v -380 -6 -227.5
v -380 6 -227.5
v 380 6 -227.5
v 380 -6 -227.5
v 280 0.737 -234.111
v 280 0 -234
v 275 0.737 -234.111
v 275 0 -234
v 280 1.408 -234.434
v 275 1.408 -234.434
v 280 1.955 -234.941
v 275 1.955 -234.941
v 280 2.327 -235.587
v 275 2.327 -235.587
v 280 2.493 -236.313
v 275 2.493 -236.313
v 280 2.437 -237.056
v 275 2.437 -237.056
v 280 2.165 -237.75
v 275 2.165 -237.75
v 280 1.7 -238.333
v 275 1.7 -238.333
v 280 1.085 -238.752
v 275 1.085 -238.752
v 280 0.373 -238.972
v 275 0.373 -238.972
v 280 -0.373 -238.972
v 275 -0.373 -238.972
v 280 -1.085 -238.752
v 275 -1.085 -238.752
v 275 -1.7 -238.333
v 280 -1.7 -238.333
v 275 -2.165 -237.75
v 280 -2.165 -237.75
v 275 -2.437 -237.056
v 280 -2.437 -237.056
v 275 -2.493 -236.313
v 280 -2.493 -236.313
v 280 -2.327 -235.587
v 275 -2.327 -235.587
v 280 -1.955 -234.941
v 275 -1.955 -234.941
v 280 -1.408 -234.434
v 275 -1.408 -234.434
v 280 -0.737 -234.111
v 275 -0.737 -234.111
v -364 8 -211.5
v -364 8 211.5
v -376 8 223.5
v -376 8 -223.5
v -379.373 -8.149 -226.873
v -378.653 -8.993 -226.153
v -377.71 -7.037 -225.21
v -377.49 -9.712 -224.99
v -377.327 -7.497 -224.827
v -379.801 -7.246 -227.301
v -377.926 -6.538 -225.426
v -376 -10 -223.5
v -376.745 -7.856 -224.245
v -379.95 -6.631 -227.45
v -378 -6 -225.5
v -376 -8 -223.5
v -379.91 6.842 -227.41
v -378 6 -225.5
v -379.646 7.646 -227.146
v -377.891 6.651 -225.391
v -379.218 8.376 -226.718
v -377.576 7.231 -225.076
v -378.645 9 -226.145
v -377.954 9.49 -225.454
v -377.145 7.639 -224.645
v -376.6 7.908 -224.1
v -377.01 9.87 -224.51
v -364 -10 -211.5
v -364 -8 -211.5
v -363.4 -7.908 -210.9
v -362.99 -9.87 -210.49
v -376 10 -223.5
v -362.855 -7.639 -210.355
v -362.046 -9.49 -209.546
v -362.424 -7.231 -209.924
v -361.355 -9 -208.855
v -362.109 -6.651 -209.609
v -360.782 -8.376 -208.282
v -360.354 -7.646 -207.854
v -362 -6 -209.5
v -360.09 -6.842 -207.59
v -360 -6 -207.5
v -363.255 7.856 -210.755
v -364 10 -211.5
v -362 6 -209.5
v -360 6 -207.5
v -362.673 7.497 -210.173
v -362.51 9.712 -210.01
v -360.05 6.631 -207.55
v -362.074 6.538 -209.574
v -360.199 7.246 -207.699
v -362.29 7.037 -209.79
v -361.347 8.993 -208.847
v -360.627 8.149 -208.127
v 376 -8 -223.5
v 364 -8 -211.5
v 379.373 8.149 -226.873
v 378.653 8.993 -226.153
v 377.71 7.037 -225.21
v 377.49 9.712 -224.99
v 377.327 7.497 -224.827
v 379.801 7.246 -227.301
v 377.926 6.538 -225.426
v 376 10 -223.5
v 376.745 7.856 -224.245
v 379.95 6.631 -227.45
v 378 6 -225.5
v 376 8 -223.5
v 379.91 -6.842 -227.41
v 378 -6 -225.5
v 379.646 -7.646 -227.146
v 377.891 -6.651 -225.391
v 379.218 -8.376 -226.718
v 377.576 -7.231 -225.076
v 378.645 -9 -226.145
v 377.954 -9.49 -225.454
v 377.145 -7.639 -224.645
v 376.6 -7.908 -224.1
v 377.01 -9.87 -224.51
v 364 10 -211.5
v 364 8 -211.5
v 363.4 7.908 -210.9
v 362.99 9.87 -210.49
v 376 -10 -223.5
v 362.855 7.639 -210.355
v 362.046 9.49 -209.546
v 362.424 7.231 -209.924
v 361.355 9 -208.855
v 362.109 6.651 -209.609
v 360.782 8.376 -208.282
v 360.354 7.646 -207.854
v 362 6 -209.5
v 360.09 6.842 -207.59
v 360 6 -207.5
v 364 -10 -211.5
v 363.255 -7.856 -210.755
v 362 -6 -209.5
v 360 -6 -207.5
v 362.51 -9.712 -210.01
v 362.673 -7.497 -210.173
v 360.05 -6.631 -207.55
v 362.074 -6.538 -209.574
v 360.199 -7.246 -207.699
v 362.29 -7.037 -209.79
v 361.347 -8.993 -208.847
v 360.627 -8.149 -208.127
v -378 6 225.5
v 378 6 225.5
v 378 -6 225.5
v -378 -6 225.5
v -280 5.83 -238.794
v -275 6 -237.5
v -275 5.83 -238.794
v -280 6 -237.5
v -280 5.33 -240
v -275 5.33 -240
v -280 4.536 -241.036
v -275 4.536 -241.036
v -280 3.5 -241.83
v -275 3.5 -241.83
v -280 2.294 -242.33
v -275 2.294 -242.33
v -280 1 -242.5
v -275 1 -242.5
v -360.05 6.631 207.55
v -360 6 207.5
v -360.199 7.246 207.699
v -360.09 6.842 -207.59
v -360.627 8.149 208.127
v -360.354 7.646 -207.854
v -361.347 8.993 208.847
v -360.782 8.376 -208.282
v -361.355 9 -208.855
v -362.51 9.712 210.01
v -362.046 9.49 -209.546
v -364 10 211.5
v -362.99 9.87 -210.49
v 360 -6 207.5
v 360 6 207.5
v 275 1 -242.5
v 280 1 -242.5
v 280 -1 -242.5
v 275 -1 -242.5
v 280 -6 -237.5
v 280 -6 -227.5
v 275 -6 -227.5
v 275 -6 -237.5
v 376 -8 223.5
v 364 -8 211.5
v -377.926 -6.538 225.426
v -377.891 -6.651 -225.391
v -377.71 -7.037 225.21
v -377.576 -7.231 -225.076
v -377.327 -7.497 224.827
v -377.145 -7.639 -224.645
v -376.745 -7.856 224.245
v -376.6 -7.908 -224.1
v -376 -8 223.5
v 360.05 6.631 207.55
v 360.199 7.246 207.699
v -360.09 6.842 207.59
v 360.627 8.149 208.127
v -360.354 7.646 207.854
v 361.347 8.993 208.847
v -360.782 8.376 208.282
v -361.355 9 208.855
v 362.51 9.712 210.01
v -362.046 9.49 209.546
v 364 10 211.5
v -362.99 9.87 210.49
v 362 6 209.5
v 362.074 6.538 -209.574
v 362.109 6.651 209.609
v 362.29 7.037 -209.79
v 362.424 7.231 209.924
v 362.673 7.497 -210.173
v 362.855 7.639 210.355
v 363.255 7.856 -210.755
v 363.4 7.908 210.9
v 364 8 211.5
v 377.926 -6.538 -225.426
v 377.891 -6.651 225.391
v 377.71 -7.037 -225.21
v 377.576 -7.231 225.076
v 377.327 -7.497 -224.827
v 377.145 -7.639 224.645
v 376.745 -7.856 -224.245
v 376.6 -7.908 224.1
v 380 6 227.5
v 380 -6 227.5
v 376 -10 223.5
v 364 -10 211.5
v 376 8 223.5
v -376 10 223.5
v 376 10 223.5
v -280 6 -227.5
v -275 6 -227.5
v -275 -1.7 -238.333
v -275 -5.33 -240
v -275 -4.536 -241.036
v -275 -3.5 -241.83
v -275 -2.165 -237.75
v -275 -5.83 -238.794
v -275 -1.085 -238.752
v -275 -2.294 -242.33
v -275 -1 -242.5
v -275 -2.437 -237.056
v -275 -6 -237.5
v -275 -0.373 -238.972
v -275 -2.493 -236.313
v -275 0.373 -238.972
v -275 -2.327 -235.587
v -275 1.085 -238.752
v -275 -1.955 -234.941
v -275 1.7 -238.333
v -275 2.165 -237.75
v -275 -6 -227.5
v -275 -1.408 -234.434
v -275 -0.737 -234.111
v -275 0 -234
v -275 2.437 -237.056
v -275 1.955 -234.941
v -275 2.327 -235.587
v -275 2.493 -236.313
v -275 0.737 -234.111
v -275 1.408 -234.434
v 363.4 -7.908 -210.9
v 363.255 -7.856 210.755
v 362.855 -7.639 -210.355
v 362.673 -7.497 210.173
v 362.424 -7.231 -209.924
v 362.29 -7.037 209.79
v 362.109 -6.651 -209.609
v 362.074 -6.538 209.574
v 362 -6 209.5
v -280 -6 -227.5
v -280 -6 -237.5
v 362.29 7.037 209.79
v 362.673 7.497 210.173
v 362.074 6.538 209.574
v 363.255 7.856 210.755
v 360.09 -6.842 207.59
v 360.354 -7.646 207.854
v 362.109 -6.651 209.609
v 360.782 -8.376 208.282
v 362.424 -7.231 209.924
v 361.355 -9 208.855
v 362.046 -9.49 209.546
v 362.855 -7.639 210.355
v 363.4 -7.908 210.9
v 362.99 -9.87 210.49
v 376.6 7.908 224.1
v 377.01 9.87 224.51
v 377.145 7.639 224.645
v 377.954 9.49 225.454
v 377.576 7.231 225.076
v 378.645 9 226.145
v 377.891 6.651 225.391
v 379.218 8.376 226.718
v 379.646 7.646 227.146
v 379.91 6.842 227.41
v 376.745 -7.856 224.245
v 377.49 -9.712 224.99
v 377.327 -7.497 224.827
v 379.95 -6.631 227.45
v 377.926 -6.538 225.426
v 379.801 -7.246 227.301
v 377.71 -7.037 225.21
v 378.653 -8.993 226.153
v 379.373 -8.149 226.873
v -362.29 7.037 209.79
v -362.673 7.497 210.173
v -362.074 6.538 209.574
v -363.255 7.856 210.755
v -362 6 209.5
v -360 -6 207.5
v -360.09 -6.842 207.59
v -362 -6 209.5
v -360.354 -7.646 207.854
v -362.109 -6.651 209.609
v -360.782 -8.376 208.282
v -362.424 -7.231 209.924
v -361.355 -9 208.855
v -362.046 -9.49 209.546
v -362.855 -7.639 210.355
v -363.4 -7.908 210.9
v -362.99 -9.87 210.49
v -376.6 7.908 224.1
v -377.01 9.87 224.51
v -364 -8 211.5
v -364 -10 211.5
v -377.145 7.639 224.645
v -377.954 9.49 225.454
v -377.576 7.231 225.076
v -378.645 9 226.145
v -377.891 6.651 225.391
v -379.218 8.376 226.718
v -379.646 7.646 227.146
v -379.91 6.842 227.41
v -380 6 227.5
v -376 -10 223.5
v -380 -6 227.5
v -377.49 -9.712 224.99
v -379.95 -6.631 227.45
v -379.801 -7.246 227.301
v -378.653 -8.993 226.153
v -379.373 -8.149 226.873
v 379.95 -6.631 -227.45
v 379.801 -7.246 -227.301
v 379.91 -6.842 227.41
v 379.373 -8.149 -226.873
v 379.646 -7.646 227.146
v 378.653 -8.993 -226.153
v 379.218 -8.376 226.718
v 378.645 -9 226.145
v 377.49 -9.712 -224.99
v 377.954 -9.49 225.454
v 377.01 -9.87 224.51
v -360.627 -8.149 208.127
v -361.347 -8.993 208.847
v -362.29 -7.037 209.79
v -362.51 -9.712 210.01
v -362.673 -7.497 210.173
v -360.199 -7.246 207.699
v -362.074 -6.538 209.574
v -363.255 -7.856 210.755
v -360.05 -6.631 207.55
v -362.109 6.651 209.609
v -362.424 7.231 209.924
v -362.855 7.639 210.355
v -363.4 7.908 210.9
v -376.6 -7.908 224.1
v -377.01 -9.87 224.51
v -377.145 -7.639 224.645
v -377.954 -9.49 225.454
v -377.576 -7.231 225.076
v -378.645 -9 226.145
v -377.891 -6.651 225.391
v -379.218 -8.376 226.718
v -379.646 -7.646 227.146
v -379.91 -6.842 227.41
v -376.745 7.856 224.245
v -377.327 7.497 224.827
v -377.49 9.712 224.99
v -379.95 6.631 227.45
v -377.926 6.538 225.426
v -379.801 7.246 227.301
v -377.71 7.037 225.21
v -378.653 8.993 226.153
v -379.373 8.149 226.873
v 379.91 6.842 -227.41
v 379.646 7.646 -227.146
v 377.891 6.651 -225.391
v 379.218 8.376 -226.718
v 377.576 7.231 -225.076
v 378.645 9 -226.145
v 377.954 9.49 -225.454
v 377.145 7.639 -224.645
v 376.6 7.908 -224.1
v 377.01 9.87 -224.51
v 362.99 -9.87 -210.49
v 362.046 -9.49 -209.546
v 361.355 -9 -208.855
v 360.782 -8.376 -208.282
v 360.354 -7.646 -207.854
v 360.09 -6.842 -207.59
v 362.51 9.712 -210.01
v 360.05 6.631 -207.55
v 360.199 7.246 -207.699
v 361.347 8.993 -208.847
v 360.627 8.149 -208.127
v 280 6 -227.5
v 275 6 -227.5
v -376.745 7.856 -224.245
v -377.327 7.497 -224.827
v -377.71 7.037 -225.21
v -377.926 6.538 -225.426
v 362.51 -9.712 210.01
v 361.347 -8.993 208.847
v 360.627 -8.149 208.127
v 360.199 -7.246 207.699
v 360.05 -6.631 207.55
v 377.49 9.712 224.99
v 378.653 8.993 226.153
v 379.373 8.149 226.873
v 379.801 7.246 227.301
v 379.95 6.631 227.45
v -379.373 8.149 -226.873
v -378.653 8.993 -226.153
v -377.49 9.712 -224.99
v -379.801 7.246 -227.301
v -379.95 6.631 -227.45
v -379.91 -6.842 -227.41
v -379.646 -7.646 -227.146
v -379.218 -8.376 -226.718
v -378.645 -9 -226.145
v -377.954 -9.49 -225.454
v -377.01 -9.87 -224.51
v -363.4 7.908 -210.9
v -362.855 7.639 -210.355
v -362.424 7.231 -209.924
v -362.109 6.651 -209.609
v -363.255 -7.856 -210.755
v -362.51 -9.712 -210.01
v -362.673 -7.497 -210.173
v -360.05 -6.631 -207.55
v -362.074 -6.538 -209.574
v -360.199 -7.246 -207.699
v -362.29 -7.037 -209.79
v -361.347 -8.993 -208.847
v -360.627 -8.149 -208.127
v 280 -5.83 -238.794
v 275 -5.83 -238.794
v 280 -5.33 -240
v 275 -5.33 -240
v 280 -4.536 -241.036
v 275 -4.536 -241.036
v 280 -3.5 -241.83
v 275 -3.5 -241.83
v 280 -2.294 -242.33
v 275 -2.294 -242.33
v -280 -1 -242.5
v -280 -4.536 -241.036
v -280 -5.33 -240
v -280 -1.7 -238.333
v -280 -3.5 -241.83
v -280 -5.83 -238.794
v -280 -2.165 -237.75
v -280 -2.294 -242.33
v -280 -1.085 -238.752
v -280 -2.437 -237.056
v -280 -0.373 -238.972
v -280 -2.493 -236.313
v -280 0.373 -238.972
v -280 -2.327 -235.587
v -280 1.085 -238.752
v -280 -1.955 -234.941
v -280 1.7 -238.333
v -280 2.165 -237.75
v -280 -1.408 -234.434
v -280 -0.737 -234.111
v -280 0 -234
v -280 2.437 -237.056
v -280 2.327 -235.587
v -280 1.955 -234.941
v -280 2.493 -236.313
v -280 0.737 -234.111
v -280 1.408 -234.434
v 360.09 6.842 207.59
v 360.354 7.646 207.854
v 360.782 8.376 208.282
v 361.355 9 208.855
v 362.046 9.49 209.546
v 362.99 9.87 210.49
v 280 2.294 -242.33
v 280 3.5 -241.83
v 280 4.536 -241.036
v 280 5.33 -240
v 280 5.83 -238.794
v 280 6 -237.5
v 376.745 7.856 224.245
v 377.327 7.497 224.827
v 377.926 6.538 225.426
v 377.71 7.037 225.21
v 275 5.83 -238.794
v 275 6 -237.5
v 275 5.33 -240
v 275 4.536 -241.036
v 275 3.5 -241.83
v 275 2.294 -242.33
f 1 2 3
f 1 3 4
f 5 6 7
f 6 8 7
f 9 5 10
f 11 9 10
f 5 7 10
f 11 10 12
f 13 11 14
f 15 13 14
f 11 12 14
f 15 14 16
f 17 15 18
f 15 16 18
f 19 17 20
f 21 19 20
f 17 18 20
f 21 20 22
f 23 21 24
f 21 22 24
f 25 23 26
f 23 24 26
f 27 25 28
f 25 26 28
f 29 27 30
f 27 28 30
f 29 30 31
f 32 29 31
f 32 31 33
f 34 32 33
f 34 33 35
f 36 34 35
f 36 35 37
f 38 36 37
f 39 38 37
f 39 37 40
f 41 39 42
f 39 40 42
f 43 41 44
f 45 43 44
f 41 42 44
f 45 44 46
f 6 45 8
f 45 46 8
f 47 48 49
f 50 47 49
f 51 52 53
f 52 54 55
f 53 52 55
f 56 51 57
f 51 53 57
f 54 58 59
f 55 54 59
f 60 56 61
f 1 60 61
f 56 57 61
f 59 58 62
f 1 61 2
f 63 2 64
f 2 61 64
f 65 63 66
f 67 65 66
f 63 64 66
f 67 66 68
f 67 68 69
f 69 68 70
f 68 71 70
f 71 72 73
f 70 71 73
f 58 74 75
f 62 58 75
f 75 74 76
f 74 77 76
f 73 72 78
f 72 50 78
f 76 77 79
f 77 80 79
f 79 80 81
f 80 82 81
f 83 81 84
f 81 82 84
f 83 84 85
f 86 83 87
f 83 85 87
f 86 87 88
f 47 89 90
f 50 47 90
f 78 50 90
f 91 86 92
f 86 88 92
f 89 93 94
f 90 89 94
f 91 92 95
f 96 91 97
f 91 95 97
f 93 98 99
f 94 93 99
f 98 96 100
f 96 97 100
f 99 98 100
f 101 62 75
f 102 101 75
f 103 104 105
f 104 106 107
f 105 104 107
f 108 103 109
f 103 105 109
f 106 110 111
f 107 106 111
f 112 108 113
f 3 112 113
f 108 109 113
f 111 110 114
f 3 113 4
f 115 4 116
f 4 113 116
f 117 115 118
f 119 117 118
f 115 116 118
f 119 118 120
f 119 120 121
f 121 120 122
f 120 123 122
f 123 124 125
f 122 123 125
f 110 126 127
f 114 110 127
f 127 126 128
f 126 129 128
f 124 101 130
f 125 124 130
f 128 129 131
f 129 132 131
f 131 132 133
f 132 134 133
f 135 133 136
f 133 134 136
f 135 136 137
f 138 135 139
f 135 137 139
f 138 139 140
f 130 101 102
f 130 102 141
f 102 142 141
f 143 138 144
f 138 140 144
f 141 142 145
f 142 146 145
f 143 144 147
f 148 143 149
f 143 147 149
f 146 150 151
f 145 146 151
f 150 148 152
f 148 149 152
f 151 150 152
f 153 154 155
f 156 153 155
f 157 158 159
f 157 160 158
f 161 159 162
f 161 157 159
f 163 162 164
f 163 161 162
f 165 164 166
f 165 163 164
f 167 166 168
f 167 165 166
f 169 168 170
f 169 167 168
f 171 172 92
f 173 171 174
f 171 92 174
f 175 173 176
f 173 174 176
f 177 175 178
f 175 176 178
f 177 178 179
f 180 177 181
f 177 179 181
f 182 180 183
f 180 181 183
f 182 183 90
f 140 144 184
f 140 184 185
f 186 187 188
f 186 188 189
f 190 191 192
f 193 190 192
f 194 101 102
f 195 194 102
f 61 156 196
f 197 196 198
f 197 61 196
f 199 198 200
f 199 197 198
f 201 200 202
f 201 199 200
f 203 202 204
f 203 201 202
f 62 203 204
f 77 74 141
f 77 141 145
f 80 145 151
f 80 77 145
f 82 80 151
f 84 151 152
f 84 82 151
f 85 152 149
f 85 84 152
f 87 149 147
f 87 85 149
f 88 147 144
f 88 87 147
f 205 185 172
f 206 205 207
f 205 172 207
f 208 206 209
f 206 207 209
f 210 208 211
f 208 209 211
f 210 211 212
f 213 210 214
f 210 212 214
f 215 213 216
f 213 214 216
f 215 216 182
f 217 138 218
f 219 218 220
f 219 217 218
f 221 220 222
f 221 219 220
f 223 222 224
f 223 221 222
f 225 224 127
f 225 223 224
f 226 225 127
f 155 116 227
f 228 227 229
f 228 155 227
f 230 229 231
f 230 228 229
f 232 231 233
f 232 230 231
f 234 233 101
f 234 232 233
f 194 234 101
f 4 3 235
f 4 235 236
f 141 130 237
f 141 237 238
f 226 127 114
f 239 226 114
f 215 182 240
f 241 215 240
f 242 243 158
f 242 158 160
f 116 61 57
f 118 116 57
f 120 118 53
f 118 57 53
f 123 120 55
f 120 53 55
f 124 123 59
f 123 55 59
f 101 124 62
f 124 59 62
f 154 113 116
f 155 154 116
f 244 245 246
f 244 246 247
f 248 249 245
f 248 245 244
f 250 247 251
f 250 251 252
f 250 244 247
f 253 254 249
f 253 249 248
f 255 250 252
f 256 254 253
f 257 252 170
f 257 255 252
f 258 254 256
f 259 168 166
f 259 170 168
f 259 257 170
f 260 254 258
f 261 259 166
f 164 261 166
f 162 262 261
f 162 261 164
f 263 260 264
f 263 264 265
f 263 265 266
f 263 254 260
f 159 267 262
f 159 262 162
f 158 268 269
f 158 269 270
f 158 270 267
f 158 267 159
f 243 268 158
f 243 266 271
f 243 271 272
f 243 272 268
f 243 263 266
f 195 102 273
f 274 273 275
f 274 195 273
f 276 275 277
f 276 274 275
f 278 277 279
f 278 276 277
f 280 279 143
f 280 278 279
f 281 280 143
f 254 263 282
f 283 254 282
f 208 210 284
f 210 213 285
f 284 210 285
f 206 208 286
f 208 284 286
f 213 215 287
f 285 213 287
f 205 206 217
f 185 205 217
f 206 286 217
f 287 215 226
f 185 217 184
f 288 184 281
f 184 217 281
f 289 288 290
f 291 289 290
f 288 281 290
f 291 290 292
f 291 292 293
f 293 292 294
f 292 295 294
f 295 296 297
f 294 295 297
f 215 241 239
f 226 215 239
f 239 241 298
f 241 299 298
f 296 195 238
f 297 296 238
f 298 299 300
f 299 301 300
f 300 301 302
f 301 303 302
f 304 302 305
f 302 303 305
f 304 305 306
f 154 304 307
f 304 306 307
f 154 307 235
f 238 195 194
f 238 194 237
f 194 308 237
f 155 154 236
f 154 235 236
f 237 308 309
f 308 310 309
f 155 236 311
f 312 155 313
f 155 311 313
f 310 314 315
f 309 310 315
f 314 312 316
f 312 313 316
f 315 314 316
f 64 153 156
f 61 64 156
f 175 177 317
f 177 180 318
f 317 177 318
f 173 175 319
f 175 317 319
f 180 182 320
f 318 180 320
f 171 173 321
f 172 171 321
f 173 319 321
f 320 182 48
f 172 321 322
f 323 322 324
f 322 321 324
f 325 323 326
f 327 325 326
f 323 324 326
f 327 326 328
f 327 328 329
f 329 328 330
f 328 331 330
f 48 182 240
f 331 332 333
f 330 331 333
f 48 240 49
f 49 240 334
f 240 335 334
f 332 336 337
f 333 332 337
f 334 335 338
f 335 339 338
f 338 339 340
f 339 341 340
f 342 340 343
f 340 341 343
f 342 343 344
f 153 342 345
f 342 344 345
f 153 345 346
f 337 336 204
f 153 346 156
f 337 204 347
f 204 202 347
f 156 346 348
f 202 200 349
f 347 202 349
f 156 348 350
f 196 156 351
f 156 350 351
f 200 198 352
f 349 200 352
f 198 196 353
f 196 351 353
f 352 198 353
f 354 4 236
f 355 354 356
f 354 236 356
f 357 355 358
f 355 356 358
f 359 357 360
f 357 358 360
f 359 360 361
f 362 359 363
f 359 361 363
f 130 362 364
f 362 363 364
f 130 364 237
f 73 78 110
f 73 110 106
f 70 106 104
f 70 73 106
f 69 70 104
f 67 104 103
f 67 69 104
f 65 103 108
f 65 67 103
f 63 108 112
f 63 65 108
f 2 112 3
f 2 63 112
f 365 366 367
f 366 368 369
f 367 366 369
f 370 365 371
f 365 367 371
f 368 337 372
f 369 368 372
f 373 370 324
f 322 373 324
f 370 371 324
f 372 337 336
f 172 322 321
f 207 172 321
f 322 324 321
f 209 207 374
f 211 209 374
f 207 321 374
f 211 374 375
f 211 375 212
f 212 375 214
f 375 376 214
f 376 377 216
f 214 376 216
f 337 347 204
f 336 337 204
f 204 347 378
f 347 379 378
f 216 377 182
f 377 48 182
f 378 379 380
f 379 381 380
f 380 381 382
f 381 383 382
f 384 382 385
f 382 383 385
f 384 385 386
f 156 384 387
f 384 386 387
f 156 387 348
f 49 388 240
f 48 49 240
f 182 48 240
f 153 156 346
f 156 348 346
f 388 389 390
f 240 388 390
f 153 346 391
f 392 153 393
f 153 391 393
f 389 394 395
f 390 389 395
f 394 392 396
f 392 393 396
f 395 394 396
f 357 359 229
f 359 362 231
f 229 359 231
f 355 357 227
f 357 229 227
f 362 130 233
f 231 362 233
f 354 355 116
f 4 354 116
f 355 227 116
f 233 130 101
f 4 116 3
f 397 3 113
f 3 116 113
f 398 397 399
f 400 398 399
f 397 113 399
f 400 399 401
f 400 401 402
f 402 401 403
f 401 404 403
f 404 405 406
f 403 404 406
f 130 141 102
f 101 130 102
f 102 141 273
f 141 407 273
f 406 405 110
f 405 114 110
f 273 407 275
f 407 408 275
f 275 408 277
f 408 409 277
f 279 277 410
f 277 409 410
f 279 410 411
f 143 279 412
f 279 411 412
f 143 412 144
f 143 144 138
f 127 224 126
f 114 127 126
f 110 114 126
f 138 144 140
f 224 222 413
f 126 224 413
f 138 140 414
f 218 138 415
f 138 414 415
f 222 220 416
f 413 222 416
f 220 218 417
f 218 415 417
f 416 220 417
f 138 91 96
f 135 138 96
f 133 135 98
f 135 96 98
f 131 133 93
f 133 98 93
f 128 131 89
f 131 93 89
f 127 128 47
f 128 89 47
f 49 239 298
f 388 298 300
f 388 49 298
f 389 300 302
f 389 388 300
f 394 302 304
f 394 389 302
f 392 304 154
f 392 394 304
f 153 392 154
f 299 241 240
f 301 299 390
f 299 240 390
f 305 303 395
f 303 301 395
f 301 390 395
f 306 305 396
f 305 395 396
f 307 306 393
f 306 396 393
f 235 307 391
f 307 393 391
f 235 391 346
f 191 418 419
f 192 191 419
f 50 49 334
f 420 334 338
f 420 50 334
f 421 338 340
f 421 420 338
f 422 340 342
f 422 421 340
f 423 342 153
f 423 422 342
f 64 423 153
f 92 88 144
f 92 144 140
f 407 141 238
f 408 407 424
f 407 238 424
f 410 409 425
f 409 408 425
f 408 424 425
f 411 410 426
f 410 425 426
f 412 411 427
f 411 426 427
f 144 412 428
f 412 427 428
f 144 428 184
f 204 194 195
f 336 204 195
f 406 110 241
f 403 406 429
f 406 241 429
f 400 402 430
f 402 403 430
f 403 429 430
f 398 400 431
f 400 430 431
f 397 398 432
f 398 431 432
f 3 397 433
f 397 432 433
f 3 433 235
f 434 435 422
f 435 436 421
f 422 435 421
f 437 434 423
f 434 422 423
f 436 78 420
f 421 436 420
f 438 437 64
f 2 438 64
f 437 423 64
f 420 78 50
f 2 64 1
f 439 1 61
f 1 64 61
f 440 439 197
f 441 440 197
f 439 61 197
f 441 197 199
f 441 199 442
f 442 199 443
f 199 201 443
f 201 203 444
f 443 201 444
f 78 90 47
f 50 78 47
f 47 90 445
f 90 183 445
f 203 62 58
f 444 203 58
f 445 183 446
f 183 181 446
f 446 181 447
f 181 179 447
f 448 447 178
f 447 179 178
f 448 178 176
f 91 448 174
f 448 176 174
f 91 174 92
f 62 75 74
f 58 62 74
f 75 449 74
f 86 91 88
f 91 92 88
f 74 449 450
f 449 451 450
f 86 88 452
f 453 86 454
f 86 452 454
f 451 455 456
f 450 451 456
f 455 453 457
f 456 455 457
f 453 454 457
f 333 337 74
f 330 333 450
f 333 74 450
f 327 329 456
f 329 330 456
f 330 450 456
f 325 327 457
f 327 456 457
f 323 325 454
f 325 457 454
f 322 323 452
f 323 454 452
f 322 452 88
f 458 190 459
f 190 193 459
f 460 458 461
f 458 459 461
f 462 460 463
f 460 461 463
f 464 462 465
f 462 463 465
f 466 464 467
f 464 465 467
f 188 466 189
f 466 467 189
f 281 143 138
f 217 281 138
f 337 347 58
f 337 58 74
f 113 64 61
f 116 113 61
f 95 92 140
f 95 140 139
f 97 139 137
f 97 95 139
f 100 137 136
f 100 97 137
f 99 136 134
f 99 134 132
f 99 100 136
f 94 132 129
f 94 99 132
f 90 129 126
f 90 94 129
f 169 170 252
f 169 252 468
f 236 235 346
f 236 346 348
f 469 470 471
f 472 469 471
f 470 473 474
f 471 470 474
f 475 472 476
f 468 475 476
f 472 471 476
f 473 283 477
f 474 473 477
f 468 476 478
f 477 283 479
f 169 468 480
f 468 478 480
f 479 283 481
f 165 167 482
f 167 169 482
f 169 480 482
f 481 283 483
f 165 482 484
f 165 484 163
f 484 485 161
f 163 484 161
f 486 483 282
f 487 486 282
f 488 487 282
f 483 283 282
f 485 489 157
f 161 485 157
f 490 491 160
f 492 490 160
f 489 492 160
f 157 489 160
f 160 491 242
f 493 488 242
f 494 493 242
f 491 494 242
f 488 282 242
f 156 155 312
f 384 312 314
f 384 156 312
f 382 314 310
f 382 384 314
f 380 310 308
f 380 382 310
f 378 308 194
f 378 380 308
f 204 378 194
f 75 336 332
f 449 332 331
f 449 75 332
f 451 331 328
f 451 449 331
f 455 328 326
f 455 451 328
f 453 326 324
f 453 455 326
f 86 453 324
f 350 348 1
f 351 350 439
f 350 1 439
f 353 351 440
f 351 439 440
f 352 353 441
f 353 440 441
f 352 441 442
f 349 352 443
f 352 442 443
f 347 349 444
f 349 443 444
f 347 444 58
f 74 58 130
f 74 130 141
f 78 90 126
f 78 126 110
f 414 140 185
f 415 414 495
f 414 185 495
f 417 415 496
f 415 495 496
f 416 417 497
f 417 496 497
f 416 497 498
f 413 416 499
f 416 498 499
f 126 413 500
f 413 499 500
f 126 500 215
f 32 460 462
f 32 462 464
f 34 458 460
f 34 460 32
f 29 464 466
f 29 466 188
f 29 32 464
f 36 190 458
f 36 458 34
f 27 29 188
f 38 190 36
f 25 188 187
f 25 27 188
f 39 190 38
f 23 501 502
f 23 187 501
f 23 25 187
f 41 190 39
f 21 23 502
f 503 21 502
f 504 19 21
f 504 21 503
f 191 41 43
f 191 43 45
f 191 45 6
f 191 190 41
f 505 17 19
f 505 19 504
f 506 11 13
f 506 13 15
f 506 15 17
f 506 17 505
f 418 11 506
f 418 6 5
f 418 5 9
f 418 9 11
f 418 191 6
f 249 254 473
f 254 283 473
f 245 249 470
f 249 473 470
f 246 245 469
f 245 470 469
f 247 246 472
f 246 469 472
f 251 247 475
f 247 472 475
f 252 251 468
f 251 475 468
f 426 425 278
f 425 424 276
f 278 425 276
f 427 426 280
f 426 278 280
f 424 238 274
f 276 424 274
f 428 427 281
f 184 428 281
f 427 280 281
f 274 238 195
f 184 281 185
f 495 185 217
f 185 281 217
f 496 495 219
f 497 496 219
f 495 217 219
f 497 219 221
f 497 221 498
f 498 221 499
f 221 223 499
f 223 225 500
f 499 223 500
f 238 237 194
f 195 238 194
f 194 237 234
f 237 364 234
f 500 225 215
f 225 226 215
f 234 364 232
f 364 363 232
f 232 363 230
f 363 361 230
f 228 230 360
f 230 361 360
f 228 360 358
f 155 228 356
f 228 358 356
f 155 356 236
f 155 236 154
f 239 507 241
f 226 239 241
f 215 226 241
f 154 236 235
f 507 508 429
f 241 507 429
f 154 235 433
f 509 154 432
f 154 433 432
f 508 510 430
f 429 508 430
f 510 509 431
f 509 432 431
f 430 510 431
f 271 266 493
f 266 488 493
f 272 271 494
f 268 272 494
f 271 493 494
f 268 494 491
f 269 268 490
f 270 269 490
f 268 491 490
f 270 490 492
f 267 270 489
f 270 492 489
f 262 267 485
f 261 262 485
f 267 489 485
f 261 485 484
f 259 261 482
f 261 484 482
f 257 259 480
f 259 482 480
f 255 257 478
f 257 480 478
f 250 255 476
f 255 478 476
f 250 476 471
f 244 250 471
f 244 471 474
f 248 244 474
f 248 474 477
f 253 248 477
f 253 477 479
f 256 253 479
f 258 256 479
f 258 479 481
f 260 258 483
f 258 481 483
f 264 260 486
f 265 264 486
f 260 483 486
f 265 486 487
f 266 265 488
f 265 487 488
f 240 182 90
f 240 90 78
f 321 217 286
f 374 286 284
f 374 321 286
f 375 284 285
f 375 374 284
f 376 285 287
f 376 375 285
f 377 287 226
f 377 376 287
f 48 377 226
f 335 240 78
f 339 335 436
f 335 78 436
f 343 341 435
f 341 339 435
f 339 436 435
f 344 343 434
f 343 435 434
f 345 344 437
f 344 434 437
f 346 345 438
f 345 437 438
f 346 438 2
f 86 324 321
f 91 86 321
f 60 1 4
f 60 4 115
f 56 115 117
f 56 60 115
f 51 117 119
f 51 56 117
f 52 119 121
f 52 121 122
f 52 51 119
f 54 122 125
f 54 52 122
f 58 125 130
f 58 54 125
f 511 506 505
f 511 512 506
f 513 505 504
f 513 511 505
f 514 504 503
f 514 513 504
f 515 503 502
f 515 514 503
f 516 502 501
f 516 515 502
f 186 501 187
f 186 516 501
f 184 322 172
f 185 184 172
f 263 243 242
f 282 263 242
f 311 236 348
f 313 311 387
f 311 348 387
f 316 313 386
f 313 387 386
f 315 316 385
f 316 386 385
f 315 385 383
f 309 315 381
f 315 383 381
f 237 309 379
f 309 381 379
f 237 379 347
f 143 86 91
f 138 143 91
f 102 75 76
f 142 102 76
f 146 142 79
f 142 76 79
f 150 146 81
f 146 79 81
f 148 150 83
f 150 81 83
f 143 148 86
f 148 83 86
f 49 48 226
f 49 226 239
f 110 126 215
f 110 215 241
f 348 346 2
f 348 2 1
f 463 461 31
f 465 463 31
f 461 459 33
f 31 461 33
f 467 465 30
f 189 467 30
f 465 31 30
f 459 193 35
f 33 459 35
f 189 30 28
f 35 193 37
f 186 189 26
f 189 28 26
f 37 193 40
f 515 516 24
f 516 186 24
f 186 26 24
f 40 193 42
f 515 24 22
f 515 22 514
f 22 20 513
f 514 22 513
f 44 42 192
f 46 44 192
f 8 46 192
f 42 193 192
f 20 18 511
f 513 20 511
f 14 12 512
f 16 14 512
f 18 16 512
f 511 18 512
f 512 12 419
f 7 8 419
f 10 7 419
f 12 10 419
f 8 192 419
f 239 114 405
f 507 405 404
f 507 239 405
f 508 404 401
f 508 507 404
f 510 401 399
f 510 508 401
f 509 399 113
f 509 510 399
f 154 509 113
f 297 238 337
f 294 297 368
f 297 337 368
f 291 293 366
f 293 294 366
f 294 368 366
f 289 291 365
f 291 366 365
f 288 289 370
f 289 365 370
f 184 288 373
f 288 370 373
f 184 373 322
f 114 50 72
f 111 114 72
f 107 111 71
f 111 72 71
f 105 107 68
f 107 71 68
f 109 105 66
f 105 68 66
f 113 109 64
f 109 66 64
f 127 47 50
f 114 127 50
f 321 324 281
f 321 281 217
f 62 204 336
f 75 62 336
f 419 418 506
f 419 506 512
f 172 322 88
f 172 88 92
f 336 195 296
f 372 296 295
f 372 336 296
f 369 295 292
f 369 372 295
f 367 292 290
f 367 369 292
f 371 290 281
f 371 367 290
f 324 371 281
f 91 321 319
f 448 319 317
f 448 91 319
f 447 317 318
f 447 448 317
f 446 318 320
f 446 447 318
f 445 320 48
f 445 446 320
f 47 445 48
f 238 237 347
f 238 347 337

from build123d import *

# Parameters (mm, degrees)
SQUARE_TUBE_CONFIGURED_20_X_20_X_2_1_DEPTH      = 785.142135624
SQUARE_TUBE_CONFIGURED_20_X_20_X_2_1_DEPTH_BACK = 25.142135624
SQUARE_TUBE_CONFIGURED_20_X_20_X_2_1_2_DEPTH    = 505.284271247
SQUARE_TUBE_CONFIGURED_20_X_20_X_2_1_3_DEPTH    = 810.284271247
SQUARE_TUBE_CONFIGURED_20_X_20_X_2_1_4_DEPTH    = 505.284271247
SKETCH12_W                                      = 5
SKETCH12_H                                      = 12
BOSS_EXTRUDE1_DEPTH                             = 15
BOSS_EXTRUDE1_2_DEPTH                           = 15
FILLET1_R                                       = 5
FILLET2_R                                       = 5
SKETCH13_R                                      = 2.5
CUT_EXTRUDE1_DEPTH                              = 699.52075846
CUT_EXTRUDE1_DEPTH_BACK                         = 699.52075846


with BuildPart() as part:
    # Sketch11 → Square tube - configured 20 X 20 X 2(1) (new, two sides)
    with BuildSketch(Plane(origin=(380, 0, -217.5), x_dir=(0, 0, 1), z_dir=(-1, 0, 0))) as square_tube_configured_20_x_20_x_2_1_sk:
        with BuildLine():
            Line((-6, -10), (6, -10))
            ThreePointArc((6, -10), (8.828427125, -8.828427125), (10, -6))
            Line((10, -6), (10, 6))
            ThreePointArc((10, 6), (8.828427125, 8.828427125), (6, 10))
            Line((6, 10), (-6, 10))
            ThreePointArc((-6, 10), (-8.828427125, 8.828427125), (-10, 6))
            Line((-10, 6), (-10, -6))
            ThreePointArc((-10, -6), (-8.828427125, -8.828427125), (-6, -10))
        make_face()
        with BuildLine():
            Line((-6, -8), (6, -8))
            ThreePointArc((6, -8), (7.414213562, -7.414213562), (8, -6))
            Line((8, -6), (8, 6))
            ThreePointArc((8, 6), (7.414213562, 7.414213562), (6, 8))
            Line((6, 8), (-6, 8))
            ThreePointArc((-6, 8), (-7.414213562, 7.414213562), (-8, 6))
            Line((-8, 6), (-8, -6))
            ThreePointArc((-8, -6), (-7.414213562, -7.414213562), (-6, -8))
        make_face(mode=Mode.SUBTRACT)
    extrude(amount=SQUARE_TUBE_CONFIGURED_20_X_20_X_2_1_DEPTH)
    extrude(square_tube_configured_20_x_20_x_2_1_sk.sketch, amount=-SQUARE_TUBE_CONFIGURED_20_X_20_X_2_1_DEPTH_BACK)

    # Square tube - configured 20 X 20 X 2(1) m
    split(bisect_by=Plane(origin=(380, 0, -227.5), x_dir=(0, -1, 0), z_dir=(-0.707106781, 0, -0.707106781)), keep=Keep.TOP)

    # Square tube - configured 20 X 20 X 2 2
    split(bisect_by=Plane(origin=(-380, 0, -227.5), x_dir=(0, 1, 0), z_dir=(0.707106781, 0, -0.707106781)), keep=Keep.TOP)


with BuildPart() as body_2:
    # Sketch11 on segment 2 (carried to segment 2) → Square tube - configured 20 X 20 X 2_1 2 (new body)
    with BuildSketch(Plane(origin=(-370, 0, -252.642135624), x_dir=(1, 0, 0), z_dir=(0, 0, 1))):
        with BuildLine():
            Line((-6, -10), (6, -10))
            ThreePointArc((6, -10), (8.828427125, -8.828427125), (10, -6))
            Line((10, -6), (10, 6))
            ThreePointArc((10, 6), (8.828427125, 8.828427125), (6, 10))
            Line((6, 10), (-6, 10))
            ThreePointArc((-6, 10), (-8.828427125, 8.828427125), (-10, 6))
            Line((-10, 6), (-10, -6))
            ThreePointArc((-10, -6), (-8.828427125, -8.828427125), (-6, -10))
        make_face()
        with BuildLine():
            Line((-6, -8), (6, -8))
            ThreePointArc((6, -8), (7.414213562, -7.414213562), (8, -6))
            Line((8, -6), (8, 6))
            ThreePointArc((8, 6), (7.414213562, 7.414213562), (6, 8))
            Line((6, 8), (-6, 8))
            ThreePointArc((-6, 8), (-7.414213562, 7.414213562), (-8, 6))
            Line((-8, 6), (-8, -6))
            ThreePointArc((-8, -6), (-7.414213562, -7.414213562), (-6, -8))
        make_face(mode=Mode.SUBTRACT)
    extrude(amount=SQUARE_TUBE_CONFIGURED_20_X_20_X_2_1_2_DEPTH)

    # Square tube - configured 20 X 20 X 2 3
    split(bisect_by=Plane(origin=(-380, 0, 227.5), x_dir=(0, -1, 0), z_dir=(-0.707106781, 0, -0.707106781)), keep=Keep.TOP)

    # Square tube - configured 20 X 20 X 2 4
    split(bisect_by=Plane(origin=(-380, 0, -227.5), x_dir=(0, -1, 0), z_dir=(-0.707106781, 0, 0.707106781)), keep=Keep.TOP)


with BuildPart() as body_3:
    # Sketch11 on segment 3 (carried to segment 3) → Square tube - configured 20 X 20 X 2_1 3 (new body)
    with BuildSketch(Plane(origin=(-405.142135624, 0, 217.5), x_dir=(0, 0, -1), z_dir=(1, 0, 0))):
        with BuildLine():
            Line((-6, -10), (6, -10))
            ThreePointArc((6, -10), (8.828427125, -8.828427125), (10, -6))
            Line((10, -6), (10, 6))
            ThreePointArc((10, 6), (8.828427125, 8.828427125), (6, 10))
            Line((6, 10), (-6, 10))
            ThreePointArc((-6, 10), (-8.828427125, 8.828427125), (-10, 6))
            Line((-10, 6), (-10, -6))
            ThreePointArc((-10, -6), (-8.828427125, -8.828427125), (-6, -10))
        make_face()
        with BuildLine():
            Line((-6, -8), (6, -8))
            ThreePointArc((6, -8), (7.414213562, -7.414213562), (8, -6))
            Line((8, -6), (8, 6))
            ThreePointArc((8, 6), (7.414213562, 7.414213562), (6, 8))
            Line((6, 8), (-6, 8))
            ThreePointArc((-6, 8), (-7.414213562, 7.414213562), (-8, 6))
            Line((-8, 6), (-8, -6))
            ThreePointArc((-8, -6), (-7.414213562, -7.414213562), (-6, -8))
        make_face(mode=Mode.SUBTRACT)
    extrude(amount=SQUARE_TUBE_CONFIGURED_20_X_20_X_2_1_3_DEPTH)

    # Square tube - configured 20 X 20 X 2 5
    split(bisect_by=Plane(origin=(380, 0, 227.5), x_dir=(0, -1, 0), z_dir=(-0.707106781, 0, 0.707106781)), keep=Keep.TOP)

    # Square tube - configured 20 X 20 X 2 6
    split(bisect_by=Plane(origin=(-380, 0, 227.5), x_dir=(0, 1, 0), z_dir=(0.707106781, 0, 0.707106781)), keep=Keep.TOP)


with BuildPart() as body_4:
    # Sketch11 on segment 4 (carried to segment 4) → Square tube - configured 20 X 20 X 2_1 4 (new body)
    with BuildSketch(Plane(origin=(370, 0, 252.642135624), x_dir=(-1, 0, 0), z_dir=(0, 0, -1))):
        with BuildLine():
            Line((-6, -10), (6, -10))
            ThreePointArc((6, -10), (8.828427125, -8.828427125), (10, -6))
            Line((10, -6), (10, 6))
            ThreePointArc((10, 6), (8.828427125, 8.828427125), (6, 10))
            Line((6, 10), (-6, 10))
            ThreePointArc((-6, 10), (-8.828427125, 8.828427125), (-10, 6))
            Line((-10, 6), (-10, -6))
            ThreePointArc((-10, -6), (-8.828427125, -8.828427125), (-6, -10))
        make_face()
        with BuildLine():
            Line((-6, -8), (6, -8))
            ThreePointArc((6, -8), (7.414213562, -7.414213562), (8, -6))
            Line((8, -6), (8, 6))
            ThreePointArc((8, 6), (7.414213562, 7.414213562), (6, 8))
            Line((6, 8), (-6, 8))
            ThreePointArc((-6, 8), (-7.414213562, 7.414213562), (-8, 6))
            Line((-8, 6), (-8, -6))
            ThreePointArc((-8, -6), (-7.414213562, -7.414213562), (-6, -8))
        make_face(mode=Mode.SUBTRACT)
    extrude(amount=SQUARE_TUBE_CONFIGURED_20_X_20_X_2_1_4_DEPTH)

    # Square tube - configured 20 X 20 X 2 7
    split(bisect_by=Plane(origin=(380, 0, 227.5), x_dir=(0, 1, 0), z_dir=(0.707106781, 0, -0.707106781)), keep=Keep.TOP)

    # Square tube - configured 20 X 20 X 2 8
    split(bisect_by=Plane(origin=(380, 0, -227.5), x_dir=(0, 1, 0), z_dir=(0.707106781, 0, 0.707106781)), keep=Keep.TOP)


with BuildPart() as body_5:
    # Sketch12 → Boss-Extrude1 (new body)
    with BuildSketch(Plane(origin=(0, 0, -227.5), x_dir=(-1, 0, 0), z_dir=(0, 0, -1))):
        with Locations((-277.5, 0)):
            Rectangle(SKETCH12_W, SKETCH12_H)
    extrude(amount=BOSS_EXTRUDE1_DEPTH)

    # Fillet1
    fillet1_edges = [body_5.edges().sort_by_distance(p)[0] for p in [
        (277.5, 6, -242.5),
        (277.5, -6, -242.5),
    ]]
    fillet(fillet1_edges, radius=FILLET1_R)


with BuildPart() as body_6:
    # Sketch12 → Boss-Extrude1 2 (new body)
    with BuildSketch(Plane(origin=(0, 0, -227.5), x_dir=(-1, 0, 0), z_dir=(0, 0, -1))):
        with Locations((277.5, 0)):
            Rectangle(SKETCH12_W, SKETCH12_H)
    extrude(amount=BOSS_EXTRUDE1_2_DEPTH)

    # Fillet2
    fillet2_edges = [body_6.edges().sort_by_distance(p)[0] for p in [
        (-277.5, -6, -242.5),
        (-277.5, 6, -242.5),
    ]]
    fillet(fillet2_edges, radius=FILLET2_R)


with BuildPart() as cut_extrude1_tool:
    # Sketch13 → Cut-Extrude1 (new, two sides)
    with BuildSketch(Plane.ZY.offset(-275)) as cut_extrude1_sk:
        with Locations((-236.5, 0)):
            Circle(SKETCH13_R)
    extrude(amount=CUT_EXTRUDE1_DEPTH)
    extrude(cut_extrude1_sk.sketch, amount=-CUT_EXTRUDE1_DEPTH_BACK)


with BuildPart() as body_5_1:
    add(body_5.part)

    # Cut-Extrude1: cut by cut_extrude1_tool
    add(cut_extrude1_tool.part, mode=Mode.SUBTRACT)


with BuildPart() as body_6_1:
    add(body_6.part)

    # Cut-Extrude1: cut by cut_extrude1_tool
    add(cut_extrude1_tool.part, mode=Mode.SUBTRACT)


solid = Compound([part.part, body_2.part, body_3.part, body_4.part, body_5_1.part, body_6_1.part])
